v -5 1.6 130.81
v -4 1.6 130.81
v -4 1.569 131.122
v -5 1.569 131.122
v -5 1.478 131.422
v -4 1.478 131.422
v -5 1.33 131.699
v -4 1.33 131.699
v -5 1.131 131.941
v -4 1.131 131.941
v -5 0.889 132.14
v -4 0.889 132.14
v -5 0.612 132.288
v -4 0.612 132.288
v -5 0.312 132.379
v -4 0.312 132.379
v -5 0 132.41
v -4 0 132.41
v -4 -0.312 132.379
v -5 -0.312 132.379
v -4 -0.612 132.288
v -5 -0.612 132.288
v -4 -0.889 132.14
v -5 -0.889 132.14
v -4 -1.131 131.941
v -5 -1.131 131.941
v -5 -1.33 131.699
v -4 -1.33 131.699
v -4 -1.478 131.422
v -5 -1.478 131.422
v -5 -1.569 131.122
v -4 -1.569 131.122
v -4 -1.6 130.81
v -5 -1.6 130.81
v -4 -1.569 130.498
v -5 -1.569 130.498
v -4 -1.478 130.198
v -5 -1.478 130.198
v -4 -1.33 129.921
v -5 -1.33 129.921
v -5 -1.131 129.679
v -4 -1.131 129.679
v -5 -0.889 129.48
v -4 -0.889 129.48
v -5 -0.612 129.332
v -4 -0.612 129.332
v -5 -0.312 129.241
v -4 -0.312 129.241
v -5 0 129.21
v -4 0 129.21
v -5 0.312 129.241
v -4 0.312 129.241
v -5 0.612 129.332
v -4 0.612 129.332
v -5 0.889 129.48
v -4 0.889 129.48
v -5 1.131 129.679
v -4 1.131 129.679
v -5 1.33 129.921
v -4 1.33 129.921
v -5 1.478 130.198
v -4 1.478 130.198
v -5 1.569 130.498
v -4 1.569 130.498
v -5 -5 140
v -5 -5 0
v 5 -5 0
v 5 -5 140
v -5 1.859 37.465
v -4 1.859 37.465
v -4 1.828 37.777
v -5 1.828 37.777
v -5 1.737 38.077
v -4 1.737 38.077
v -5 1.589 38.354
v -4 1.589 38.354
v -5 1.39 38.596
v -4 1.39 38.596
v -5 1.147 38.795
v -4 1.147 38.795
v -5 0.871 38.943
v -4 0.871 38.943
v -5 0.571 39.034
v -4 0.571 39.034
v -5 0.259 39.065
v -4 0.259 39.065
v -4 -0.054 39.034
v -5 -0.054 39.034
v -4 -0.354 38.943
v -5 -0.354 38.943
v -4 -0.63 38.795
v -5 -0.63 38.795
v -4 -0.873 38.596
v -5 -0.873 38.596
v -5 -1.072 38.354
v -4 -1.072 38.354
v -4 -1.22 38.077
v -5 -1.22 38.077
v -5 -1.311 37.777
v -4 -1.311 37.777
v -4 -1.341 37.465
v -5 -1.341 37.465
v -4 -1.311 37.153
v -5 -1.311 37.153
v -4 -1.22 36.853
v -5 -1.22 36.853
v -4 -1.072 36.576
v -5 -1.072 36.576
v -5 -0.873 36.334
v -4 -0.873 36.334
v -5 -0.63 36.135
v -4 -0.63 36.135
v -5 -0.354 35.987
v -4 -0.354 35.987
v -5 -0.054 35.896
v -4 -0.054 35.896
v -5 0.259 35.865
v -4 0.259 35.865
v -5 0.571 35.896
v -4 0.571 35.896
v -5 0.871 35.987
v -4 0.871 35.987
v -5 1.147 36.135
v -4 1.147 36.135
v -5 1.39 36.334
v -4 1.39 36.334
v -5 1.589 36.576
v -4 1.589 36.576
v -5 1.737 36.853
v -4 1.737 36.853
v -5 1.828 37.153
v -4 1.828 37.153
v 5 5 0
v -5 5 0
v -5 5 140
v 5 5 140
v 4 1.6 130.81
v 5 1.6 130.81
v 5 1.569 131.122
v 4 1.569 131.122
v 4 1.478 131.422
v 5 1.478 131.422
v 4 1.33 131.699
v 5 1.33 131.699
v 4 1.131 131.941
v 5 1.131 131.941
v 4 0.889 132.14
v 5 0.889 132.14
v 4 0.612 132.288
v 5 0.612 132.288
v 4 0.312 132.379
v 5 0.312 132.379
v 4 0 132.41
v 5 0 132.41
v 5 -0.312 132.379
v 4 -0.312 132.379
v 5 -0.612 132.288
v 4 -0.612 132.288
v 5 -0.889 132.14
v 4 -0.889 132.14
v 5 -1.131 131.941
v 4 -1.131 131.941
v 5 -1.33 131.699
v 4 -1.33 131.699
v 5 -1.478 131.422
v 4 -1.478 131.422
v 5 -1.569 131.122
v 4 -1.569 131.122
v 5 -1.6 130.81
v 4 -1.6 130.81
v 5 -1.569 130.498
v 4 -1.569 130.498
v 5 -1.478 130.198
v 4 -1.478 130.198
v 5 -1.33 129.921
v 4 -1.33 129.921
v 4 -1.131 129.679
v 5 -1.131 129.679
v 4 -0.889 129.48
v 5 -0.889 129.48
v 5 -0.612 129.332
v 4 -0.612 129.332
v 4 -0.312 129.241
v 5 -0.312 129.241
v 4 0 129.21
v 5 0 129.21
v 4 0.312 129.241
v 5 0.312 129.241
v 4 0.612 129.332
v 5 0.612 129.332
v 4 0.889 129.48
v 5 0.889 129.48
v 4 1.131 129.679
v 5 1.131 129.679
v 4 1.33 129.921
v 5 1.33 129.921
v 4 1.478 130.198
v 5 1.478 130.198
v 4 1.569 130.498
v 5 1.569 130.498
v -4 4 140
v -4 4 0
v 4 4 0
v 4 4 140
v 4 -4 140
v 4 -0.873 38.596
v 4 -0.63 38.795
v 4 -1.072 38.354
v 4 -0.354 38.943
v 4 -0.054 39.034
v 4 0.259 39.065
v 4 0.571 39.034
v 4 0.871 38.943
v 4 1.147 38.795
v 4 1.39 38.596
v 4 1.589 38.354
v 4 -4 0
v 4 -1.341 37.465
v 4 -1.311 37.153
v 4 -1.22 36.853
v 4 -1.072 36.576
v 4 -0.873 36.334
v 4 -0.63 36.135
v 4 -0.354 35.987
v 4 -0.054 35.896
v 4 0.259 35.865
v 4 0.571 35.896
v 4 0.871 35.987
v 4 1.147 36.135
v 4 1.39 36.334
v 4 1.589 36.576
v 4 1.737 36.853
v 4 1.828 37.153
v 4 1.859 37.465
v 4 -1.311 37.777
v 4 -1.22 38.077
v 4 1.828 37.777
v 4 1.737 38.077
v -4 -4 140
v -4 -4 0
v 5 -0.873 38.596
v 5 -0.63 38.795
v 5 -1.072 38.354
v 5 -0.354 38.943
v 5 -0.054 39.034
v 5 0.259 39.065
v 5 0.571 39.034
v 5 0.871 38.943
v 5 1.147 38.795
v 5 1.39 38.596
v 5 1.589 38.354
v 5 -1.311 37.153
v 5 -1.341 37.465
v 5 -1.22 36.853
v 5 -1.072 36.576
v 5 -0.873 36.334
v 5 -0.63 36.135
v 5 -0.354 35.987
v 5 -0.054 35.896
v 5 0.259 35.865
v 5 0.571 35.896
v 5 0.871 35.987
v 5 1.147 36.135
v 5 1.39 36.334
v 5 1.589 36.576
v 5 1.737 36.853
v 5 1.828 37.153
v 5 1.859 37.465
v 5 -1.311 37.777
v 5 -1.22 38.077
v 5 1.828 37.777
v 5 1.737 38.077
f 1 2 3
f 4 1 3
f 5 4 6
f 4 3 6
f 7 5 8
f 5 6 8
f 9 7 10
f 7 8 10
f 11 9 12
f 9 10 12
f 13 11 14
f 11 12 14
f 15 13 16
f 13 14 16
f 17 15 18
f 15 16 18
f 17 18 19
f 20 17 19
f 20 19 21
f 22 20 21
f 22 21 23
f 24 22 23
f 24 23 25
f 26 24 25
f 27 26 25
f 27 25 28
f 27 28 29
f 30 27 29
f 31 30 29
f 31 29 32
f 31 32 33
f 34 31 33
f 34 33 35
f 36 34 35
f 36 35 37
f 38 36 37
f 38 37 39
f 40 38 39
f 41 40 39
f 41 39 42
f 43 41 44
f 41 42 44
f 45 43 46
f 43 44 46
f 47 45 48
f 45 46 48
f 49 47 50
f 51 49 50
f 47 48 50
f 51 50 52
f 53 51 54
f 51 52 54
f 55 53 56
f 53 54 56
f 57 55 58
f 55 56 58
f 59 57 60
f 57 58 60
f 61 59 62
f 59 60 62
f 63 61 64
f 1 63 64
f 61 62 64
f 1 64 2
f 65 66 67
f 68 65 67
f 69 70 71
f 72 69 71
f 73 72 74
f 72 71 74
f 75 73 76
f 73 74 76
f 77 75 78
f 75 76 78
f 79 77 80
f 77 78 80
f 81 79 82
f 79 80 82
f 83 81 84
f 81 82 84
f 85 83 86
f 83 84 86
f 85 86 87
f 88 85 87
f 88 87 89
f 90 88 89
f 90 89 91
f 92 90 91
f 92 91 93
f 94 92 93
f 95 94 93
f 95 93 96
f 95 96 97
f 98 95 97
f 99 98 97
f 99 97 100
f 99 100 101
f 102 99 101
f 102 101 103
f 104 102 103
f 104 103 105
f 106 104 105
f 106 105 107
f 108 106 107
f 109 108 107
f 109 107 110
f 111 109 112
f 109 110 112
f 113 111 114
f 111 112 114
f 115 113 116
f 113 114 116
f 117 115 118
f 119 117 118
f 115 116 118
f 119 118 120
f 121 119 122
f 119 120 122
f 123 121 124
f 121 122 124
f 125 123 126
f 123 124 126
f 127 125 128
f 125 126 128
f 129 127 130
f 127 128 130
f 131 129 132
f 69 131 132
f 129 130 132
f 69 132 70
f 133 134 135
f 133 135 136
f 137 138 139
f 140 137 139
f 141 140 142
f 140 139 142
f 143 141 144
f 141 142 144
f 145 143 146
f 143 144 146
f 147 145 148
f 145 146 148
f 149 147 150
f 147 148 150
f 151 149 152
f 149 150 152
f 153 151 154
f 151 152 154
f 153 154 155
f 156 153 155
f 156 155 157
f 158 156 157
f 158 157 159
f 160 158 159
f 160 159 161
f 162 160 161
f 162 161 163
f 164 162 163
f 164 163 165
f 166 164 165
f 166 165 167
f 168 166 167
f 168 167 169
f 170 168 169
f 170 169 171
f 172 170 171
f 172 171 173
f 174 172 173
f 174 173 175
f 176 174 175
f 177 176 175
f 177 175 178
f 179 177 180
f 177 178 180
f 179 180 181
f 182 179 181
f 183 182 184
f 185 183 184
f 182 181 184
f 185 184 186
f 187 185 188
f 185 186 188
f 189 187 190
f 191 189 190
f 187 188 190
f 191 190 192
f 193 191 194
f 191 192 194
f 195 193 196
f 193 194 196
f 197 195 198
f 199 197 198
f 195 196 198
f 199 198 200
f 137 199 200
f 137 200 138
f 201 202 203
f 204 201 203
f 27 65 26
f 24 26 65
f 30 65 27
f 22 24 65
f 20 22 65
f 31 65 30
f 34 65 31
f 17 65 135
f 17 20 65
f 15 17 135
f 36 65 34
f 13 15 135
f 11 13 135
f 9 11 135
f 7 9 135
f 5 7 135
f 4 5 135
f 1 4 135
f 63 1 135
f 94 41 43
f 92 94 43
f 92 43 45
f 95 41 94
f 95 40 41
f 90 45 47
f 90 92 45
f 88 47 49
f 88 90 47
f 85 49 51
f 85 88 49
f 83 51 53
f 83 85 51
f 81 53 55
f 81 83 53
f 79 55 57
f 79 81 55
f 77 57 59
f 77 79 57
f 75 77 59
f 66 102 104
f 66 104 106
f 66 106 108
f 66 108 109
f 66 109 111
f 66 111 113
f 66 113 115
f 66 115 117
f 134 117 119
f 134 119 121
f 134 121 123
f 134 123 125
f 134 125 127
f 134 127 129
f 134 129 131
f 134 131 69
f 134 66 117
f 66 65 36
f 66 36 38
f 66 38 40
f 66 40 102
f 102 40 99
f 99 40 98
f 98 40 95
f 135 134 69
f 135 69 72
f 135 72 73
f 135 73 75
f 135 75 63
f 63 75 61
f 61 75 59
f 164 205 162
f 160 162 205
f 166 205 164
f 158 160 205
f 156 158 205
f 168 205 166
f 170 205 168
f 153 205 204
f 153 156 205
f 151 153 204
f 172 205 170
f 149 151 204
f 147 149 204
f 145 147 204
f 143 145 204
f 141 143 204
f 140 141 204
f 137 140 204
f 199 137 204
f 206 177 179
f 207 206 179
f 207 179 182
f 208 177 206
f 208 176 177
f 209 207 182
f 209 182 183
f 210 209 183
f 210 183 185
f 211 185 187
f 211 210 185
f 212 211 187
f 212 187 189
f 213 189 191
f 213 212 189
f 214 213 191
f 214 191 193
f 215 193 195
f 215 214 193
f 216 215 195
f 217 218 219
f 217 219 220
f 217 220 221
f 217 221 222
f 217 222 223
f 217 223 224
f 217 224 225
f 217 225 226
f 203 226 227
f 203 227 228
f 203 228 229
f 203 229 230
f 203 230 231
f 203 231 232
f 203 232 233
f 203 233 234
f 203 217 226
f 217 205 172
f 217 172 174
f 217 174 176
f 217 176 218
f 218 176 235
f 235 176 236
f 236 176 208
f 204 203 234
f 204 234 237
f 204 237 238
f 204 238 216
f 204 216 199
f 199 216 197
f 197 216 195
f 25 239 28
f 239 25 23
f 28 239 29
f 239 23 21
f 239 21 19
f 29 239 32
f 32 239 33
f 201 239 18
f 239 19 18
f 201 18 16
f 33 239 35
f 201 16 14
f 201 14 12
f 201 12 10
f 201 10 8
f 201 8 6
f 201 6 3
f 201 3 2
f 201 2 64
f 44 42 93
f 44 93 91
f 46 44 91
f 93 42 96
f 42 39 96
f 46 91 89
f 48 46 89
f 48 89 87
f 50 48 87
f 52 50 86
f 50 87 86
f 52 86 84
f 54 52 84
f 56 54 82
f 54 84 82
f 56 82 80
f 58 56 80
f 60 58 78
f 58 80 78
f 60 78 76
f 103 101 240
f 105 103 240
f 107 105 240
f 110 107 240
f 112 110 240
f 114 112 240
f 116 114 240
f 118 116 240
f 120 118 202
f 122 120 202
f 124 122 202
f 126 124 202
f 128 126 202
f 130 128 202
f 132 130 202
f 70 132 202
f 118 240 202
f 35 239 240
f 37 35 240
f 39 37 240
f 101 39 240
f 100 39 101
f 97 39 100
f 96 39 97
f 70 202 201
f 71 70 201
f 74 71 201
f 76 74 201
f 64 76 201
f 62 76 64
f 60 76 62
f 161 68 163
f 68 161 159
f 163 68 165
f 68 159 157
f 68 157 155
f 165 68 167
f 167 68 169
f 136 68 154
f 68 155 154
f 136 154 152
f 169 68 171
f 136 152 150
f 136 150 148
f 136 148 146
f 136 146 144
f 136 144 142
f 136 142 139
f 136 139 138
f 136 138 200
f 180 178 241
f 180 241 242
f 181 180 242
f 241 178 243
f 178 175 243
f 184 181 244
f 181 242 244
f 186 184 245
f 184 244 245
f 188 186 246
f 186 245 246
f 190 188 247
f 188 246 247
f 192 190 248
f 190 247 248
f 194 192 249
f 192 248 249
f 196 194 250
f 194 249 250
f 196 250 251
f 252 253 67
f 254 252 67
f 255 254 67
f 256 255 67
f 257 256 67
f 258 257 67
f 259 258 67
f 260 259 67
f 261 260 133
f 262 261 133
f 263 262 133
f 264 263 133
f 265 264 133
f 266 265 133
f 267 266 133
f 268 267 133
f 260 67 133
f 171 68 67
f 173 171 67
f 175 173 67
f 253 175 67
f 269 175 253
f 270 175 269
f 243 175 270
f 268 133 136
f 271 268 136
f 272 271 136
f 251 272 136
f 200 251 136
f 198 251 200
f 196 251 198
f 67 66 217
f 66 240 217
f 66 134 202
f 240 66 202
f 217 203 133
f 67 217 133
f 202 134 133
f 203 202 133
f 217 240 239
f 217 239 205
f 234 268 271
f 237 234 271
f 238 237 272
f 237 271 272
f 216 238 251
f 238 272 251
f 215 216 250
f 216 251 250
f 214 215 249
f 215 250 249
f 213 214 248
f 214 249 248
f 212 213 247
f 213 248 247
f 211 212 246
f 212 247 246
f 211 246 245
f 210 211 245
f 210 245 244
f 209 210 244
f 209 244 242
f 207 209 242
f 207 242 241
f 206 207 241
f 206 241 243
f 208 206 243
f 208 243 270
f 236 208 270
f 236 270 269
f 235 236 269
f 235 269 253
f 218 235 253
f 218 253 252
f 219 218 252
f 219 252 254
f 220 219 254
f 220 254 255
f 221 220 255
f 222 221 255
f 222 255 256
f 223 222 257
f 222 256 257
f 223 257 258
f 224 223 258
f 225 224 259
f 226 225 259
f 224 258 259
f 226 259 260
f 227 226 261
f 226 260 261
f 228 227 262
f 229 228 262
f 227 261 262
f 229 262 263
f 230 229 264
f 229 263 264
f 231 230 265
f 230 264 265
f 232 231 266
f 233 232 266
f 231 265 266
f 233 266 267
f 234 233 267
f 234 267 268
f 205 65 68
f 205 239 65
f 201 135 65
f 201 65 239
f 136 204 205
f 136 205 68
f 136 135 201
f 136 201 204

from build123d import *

# Parameters (mm, degrees)
SKETCH_1_W          = 10
SKETCH_1_H          = 10
SKETCH_1_W_2        = 8
SKETCH_1_H_2        = 8
EXTRUDE_1_DEPTH     = 140
SKETCH_2_R          = 1.6
CUT_EXTRUDE_1_DEPTH = 141.445719052
SKETCH_3_R          = 1.6
CUT_EXTRUDE_2_DEPTH = 141.445719052


with BuildPart() as part:
    # ｽｹｯﾁ1 → ﾎﾞｽ - 押し出し1 (new body)
    with BuildSketch(Plane.XY):
        Rectangle(SKETCH_1_W, SKETCH_1_H)
        Rectangle(SKETCH_1_W_2, SKETCH_1_H_2, mode=Mode.SUBTRACT)
    extrude(amount=EXTRUDE_1_DEPTH)

    # ｽｹｯﾁ2 → ｶｯﾄ - 押し出し1 (cut, through all)
    with BuildSketch(Plane(origin=(5, 0, 0), x_dir=(0, 0, -1), z_dir=(1, 0, 0))):
        with Locations(Location((-130.81, 0, 0), (0, 0, 90))):
            Circle(SKETCH_2_R)
    extrude(amount=-CUT_EXTRUDE_1_DEPTH, mode=Mode.SUBTRACT)

    # ｽｹｯﾁ3 → ｶｯﾄ - 押し出し2 (cut, through all)
    with BuildSketch(Plane(origin=(5, 0, 0), x_dir=(0, 0, -1), z_dir=(1, 0, 0))):
        with Locations(Location((-37.465120214, 0.258526647, 0), (0, 0, 90))):
            Circle(SKETCH_3_R)
    extrude(amount=-CUT_EXTRUDE_2_DEPTH, mode=Mode.SUBTRACT)


solid = part.part
